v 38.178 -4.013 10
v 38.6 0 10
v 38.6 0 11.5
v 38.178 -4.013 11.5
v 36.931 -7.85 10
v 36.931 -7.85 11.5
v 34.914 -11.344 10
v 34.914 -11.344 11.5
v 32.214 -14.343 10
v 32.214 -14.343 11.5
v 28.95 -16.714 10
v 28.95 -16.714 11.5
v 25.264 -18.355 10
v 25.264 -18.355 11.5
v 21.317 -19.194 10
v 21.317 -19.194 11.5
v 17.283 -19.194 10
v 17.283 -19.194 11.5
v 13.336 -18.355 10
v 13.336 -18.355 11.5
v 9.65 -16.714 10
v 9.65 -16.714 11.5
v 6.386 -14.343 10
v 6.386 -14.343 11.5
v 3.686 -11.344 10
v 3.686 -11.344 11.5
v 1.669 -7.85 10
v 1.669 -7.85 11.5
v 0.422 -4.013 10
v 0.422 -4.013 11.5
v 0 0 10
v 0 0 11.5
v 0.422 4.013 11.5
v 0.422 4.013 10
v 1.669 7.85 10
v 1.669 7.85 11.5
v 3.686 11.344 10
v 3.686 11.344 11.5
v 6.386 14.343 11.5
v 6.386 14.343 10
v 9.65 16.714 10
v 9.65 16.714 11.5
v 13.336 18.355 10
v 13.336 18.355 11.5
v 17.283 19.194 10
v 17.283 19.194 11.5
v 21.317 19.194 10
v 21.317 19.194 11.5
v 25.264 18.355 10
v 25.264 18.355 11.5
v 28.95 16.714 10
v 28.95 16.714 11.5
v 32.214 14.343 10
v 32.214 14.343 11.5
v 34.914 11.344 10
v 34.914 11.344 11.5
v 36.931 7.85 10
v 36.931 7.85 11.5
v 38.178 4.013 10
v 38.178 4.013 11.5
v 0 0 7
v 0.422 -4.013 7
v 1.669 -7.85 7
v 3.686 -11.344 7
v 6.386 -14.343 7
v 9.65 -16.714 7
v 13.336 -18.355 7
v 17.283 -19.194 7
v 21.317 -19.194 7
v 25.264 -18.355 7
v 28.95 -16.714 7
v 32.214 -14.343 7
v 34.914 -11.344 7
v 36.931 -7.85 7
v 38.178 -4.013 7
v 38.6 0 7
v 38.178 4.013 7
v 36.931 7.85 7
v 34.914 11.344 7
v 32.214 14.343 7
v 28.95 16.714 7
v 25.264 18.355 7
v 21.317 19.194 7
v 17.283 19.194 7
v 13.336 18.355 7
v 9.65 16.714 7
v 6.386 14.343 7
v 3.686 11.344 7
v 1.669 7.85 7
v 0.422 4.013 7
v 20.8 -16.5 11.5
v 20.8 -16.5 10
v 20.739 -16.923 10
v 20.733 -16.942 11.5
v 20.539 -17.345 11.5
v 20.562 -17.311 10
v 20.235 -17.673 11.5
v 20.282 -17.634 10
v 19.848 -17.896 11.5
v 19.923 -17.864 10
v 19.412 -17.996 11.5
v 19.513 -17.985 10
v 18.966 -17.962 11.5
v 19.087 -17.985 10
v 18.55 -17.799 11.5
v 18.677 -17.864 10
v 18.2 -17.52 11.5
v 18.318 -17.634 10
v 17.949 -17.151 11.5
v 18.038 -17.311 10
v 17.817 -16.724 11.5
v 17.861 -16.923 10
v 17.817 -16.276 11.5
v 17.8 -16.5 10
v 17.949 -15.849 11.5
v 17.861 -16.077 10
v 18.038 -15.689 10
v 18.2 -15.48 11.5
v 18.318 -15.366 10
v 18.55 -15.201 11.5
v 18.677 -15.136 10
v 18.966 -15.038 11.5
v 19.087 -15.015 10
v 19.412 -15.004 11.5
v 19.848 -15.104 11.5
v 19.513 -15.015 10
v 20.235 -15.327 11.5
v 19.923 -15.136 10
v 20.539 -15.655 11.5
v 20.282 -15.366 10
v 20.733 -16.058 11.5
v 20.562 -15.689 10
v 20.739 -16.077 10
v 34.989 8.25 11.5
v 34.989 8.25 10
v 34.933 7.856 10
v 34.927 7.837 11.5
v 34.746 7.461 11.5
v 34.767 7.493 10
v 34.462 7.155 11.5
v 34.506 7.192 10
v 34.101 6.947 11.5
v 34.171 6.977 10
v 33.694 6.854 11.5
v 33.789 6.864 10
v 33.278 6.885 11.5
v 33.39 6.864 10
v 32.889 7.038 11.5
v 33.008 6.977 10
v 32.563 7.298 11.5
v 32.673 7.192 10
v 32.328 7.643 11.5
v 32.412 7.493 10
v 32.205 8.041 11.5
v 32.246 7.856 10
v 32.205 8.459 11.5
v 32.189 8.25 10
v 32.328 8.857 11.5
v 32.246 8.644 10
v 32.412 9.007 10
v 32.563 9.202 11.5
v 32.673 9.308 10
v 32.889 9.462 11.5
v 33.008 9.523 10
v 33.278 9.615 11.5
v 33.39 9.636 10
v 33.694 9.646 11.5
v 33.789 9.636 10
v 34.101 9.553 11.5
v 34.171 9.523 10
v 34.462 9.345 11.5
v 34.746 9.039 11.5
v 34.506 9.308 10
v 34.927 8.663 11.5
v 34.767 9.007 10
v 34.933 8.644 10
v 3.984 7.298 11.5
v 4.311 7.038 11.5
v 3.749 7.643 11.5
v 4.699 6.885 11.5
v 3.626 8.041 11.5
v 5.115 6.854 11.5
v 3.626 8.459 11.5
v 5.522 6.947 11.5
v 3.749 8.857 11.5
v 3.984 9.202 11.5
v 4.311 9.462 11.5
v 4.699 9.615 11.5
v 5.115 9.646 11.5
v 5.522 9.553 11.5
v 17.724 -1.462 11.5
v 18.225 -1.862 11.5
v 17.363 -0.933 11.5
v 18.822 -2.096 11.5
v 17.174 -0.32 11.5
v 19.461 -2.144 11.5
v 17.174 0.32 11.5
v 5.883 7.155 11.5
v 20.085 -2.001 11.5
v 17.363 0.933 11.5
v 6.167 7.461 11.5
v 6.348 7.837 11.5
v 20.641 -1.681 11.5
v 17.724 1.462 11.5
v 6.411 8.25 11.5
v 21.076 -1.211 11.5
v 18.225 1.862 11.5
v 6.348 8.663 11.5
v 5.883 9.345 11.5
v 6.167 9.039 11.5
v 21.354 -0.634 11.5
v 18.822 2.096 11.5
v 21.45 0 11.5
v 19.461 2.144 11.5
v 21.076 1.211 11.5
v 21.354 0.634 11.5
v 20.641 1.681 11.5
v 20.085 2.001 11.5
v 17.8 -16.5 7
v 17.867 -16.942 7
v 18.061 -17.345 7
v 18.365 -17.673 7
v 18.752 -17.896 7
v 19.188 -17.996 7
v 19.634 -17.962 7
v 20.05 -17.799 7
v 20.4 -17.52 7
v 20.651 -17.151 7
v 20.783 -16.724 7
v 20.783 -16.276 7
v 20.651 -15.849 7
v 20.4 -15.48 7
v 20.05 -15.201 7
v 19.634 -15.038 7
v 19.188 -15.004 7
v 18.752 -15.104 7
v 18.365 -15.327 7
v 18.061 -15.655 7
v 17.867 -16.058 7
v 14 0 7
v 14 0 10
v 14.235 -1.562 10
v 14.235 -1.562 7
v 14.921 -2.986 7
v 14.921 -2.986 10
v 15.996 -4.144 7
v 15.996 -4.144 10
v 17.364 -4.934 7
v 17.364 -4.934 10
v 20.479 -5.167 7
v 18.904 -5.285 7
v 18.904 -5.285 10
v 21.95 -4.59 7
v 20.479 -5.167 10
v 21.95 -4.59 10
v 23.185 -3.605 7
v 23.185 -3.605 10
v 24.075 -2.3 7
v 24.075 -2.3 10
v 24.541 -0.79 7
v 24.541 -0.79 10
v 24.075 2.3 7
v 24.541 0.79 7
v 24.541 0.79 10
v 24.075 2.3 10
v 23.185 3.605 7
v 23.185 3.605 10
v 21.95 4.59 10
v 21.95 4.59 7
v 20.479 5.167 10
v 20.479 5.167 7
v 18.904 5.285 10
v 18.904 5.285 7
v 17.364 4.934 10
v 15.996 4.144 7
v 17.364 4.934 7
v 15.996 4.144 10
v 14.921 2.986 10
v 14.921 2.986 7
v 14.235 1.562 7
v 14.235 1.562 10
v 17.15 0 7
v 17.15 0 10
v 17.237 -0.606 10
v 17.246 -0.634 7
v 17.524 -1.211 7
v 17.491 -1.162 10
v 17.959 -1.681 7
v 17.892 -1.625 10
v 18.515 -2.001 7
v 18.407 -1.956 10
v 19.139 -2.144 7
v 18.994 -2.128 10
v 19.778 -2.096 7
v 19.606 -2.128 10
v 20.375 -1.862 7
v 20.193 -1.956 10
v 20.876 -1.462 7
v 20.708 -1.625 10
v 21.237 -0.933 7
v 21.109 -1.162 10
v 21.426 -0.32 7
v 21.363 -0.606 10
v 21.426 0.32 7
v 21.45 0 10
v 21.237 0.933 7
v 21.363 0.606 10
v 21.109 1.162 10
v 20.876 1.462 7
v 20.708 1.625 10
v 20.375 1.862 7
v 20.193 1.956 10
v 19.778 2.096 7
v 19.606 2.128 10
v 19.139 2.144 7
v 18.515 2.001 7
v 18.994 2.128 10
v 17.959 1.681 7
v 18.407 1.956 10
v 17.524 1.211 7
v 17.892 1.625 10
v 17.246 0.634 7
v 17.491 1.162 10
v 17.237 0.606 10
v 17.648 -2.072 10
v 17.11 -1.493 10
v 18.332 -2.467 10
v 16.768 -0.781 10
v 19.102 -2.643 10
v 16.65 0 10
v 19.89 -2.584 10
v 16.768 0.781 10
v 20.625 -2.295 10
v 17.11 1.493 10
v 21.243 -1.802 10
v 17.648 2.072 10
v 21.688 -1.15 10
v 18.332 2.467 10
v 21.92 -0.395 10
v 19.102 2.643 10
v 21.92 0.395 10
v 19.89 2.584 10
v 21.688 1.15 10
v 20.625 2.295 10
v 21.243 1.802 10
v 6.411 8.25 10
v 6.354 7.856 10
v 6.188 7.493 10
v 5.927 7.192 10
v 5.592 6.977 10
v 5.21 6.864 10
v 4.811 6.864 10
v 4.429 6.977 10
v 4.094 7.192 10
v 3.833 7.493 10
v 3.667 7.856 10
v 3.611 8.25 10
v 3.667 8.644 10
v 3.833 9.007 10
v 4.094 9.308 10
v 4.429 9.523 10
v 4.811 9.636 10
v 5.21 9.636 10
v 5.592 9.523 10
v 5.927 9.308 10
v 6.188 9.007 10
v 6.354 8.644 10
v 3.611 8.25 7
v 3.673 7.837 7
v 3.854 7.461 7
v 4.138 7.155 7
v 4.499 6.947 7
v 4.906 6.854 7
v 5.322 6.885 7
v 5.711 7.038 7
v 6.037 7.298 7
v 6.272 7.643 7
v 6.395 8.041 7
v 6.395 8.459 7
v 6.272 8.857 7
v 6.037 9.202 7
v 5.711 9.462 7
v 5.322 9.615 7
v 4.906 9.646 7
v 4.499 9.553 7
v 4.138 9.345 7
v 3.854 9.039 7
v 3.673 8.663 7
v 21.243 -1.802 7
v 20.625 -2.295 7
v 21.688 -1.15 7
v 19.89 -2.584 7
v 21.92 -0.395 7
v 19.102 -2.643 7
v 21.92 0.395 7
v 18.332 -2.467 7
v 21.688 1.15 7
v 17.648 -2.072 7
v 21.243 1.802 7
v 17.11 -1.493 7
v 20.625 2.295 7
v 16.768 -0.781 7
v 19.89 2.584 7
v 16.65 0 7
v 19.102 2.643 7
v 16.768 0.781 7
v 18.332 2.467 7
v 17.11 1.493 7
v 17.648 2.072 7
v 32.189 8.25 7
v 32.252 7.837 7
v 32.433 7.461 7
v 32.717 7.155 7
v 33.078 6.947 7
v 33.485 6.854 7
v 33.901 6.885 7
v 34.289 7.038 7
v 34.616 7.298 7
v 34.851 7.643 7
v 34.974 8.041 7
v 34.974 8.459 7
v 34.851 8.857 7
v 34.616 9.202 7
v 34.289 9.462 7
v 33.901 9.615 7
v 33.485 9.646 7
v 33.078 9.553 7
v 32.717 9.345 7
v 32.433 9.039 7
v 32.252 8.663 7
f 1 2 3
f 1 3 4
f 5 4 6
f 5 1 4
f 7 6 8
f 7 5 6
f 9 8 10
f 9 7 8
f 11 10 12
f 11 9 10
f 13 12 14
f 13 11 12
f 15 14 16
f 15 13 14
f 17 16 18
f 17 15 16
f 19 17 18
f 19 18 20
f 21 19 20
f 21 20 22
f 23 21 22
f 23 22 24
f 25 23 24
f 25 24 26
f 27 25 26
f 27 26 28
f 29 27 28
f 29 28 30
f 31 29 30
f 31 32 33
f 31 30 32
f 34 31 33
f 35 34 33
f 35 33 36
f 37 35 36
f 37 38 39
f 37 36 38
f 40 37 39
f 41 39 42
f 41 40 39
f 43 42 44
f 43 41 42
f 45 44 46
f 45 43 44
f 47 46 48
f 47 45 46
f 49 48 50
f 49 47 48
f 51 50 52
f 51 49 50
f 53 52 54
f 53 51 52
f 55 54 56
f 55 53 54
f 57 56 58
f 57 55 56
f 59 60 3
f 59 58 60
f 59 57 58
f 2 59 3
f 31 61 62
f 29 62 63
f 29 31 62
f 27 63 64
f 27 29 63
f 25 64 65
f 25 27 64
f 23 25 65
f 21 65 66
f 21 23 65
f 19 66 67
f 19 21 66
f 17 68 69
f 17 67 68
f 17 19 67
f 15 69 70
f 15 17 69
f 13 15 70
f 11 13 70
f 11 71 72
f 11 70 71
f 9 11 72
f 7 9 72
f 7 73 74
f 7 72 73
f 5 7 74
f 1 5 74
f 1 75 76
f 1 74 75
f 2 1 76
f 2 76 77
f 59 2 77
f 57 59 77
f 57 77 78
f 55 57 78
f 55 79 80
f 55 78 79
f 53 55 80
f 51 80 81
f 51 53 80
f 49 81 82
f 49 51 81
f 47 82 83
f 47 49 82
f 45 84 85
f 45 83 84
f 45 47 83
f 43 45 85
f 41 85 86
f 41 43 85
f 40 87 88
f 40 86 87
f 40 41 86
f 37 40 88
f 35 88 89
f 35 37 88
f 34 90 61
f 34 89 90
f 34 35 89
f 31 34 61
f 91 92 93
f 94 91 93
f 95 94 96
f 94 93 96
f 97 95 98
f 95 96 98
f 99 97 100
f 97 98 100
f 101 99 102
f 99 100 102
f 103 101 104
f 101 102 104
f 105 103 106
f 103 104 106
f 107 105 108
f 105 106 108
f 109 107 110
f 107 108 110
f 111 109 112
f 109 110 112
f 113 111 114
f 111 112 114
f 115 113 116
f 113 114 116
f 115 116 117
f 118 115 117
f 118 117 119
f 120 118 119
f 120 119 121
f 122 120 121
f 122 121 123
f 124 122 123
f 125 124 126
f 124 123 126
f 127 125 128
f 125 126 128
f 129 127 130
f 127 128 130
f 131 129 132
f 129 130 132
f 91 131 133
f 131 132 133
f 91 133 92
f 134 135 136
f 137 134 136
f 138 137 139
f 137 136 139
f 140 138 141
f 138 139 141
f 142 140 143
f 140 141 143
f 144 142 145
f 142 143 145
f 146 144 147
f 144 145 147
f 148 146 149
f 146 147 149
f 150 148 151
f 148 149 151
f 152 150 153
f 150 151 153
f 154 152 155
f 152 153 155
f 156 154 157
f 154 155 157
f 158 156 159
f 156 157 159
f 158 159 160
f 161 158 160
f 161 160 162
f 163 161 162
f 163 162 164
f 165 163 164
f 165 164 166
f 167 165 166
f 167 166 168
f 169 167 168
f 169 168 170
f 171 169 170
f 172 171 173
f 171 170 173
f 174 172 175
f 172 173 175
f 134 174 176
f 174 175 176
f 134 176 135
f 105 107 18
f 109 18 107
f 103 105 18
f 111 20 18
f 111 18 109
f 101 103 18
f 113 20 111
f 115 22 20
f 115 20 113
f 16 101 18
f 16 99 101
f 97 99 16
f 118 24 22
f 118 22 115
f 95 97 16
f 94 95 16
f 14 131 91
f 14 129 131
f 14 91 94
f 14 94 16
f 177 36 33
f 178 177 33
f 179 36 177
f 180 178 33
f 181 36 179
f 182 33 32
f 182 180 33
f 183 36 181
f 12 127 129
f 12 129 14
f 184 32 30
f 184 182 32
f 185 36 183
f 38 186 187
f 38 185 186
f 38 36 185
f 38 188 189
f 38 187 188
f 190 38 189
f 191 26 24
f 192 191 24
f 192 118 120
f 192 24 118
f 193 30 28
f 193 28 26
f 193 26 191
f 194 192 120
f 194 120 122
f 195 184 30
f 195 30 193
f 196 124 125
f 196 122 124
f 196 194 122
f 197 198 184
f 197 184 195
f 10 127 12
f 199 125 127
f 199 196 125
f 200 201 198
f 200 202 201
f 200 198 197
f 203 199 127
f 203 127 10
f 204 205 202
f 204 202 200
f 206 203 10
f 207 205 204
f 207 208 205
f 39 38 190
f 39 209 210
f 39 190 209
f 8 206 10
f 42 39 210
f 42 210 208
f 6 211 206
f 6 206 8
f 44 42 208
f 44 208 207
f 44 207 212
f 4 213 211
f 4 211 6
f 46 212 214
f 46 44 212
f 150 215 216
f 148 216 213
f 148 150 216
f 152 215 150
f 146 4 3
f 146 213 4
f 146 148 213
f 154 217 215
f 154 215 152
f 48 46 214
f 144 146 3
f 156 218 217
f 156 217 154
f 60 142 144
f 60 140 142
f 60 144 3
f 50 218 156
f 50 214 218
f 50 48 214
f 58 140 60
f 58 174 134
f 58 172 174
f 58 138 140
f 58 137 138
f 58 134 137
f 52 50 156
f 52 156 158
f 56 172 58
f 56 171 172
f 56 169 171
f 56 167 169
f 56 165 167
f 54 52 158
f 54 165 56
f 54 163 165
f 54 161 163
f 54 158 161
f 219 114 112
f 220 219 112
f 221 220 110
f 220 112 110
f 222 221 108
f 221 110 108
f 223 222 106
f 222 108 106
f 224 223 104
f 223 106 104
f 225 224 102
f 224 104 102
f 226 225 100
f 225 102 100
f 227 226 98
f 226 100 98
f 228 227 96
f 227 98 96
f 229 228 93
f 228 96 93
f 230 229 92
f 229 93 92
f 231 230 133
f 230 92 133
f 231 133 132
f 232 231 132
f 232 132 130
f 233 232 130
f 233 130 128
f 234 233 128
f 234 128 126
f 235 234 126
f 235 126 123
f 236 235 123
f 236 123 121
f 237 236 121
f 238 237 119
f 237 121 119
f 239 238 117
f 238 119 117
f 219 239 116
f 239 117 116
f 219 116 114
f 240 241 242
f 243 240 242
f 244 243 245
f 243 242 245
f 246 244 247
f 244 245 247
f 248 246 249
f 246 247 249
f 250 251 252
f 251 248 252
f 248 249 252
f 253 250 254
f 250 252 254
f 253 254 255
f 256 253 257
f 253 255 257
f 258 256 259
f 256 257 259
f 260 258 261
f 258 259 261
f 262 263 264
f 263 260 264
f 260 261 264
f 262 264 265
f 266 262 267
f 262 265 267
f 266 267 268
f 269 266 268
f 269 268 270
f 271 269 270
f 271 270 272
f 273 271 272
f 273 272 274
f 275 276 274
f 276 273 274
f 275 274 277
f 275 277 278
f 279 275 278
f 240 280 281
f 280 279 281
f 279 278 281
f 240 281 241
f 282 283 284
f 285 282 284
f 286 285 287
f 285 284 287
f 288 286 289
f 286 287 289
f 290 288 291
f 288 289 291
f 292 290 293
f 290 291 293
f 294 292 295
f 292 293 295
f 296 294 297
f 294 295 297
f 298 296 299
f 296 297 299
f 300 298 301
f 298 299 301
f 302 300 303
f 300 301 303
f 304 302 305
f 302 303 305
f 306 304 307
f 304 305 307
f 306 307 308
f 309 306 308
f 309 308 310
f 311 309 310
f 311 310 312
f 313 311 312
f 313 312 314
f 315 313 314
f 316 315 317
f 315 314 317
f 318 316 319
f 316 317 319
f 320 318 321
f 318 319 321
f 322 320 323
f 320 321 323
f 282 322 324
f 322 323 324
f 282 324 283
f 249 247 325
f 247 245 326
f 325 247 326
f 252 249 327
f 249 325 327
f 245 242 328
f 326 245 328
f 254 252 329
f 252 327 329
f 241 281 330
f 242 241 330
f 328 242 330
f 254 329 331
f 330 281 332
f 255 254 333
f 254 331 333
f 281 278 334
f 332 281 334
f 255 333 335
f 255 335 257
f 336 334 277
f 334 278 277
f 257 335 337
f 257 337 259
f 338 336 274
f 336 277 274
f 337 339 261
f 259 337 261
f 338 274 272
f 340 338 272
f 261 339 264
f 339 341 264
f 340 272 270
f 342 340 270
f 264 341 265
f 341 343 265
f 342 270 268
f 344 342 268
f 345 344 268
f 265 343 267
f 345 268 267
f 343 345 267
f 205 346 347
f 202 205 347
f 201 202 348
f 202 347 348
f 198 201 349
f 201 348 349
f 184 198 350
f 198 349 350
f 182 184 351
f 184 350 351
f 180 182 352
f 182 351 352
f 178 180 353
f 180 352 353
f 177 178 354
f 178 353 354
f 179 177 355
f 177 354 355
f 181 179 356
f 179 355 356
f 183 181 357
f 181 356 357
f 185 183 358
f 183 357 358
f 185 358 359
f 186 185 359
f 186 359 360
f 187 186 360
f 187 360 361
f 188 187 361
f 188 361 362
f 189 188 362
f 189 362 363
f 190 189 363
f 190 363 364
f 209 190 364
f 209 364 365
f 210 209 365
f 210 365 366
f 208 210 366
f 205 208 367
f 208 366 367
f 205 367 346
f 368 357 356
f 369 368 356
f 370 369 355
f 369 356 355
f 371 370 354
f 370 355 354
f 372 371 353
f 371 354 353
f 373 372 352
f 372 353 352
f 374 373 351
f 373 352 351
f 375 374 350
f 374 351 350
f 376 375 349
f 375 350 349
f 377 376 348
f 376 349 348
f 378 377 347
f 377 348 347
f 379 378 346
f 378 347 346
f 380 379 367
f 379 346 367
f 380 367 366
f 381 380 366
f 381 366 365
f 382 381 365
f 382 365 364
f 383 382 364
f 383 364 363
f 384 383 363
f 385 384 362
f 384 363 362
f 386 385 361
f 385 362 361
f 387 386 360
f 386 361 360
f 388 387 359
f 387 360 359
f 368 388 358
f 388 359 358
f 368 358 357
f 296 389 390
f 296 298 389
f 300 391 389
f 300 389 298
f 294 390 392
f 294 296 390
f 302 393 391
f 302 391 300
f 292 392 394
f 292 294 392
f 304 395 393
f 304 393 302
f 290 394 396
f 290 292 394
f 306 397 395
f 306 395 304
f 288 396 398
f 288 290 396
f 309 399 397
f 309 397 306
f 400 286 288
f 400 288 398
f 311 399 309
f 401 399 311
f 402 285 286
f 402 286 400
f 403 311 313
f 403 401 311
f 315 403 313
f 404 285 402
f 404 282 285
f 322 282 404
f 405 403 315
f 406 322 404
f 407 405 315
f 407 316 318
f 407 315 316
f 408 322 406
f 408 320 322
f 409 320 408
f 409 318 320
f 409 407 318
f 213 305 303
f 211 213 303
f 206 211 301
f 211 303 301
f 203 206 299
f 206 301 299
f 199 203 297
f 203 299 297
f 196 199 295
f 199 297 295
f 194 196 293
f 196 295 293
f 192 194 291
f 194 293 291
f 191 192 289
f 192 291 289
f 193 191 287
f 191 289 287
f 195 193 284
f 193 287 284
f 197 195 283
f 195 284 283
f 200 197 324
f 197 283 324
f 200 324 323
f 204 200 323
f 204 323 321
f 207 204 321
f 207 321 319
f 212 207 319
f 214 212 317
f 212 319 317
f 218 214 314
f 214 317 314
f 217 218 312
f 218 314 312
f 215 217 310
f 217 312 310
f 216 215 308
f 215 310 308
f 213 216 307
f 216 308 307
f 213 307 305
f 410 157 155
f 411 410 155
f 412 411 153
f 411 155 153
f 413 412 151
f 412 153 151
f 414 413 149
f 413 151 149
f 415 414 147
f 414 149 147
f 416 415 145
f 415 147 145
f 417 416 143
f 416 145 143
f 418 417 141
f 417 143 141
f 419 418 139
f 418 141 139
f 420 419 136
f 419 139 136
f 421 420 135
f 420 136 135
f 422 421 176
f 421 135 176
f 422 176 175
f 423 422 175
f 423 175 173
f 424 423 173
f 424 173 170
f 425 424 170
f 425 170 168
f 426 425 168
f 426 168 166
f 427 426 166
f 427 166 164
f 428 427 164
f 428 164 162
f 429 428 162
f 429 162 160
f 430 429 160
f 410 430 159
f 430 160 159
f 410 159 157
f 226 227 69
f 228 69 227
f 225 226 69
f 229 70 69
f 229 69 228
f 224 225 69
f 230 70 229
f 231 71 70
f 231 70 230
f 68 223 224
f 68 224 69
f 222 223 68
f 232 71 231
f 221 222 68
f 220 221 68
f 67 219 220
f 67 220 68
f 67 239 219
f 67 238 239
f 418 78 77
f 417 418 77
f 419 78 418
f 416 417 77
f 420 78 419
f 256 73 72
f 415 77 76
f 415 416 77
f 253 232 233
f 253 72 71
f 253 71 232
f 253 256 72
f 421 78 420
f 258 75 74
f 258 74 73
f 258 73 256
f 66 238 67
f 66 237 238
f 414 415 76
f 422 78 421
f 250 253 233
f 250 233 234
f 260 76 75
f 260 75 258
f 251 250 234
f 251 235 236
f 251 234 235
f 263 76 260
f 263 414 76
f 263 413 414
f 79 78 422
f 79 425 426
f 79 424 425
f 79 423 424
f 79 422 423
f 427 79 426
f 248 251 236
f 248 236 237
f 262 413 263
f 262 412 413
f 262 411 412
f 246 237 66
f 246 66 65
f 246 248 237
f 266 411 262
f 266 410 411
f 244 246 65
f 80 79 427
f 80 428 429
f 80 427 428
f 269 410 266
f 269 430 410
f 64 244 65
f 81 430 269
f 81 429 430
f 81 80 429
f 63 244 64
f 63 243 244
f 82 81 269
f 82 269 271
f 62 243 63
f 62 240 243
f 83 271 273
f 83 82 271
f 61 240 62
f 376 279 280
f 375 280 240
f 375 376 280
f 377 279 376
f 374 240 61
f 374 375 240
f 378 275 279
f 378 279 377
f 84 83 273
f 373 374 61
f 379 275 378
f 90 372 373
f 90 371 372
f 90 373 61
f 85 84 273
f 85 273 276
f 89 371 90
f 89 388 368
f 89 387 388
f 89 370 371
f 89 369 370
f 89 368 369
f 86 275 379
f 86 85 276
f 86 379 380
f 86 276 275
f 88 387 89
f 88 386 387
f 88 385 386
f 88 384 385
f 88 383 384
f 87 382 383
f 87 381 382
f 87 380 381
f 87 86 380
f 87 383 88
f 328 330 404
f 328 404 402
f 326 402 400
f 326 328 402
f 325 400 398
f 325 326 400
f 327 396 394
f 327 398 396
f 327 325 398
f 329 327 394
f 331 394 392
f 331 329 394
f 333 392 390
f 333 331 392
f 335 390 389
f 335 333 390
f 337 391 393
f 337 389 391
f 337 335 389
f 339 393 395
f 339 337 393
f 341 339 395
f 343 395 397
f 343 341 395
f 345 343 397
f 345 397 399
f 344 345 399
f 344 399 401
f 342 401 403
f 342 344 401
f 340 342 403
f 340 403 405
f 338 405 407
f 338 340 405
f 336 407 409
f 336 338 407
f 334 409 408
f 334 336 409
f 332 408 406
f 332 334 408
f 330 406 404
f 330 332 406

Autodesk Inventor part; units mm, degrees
ref_plane "YZ Plane" through (0, 0, 0) normal (1, 0, 0) x (0, 1, 0)
ref_plane "XY Plane" through (0, 0, 0) normal (0, 0, 1) x (1, 0, 0)
ref_plane "Arbeitsebene1" through (0, 0, 10) normal (0, 0, 1) x (1, 0, 0)
sketch "Skizze1" plane through (0, 0, 10) normal (0, 0, 1) x (1, 0, 0)
  circle A0 centre (19.3, 0) radius 19.3 projected
  circle A1 centre (5.0106, 8.25) radius 1.4 projected
  circle A2 centre (33.5894, 8.25) radius 1.4 projected
  circle A3 centre (19.3, -16.5) radius 1.5 projected
  circle A4 centre (19.3, 0) radius 2.15
  point P0 (0, 0)
  dimension "d0" = 4.3
extrude "Extrusion1" add sketch "Skizze1" along normal blind 1.5
sketch "Skizze2" plane through (19.3, 0, 10) normal (0, 0, -1) x (-1, 0, 0)
  circle A0 centre (0, 0) radius 2.15 projected
  circle A1 centre (0, 0) radius 5.3
  circle A2 centre (0, 0) radius 19.3 projected
  circle A3 centre (0, 0) radius 2.15 projected
  circle A4 centre (0, -16.5) radius 1.5 projected
  circle A5 centre (-14.2894, 8.25) radius 1.4 projected
  circle A6 centre (14.2894, 8.25) radius 1.4 projected
  circle A7 centre (0, 0) radius 5.8
  circle A8 centre (0, 0) radius 8
  circle A9 centre (0, 0) radius 2.65
  point P0 (19.3, 0)
  dimension "d6" = 10.6
  dimension "d7" = 0.5
  dimension "d8" = 16
  dimension "d13" = 0.5
extrude "Extrusion2" add sketch "Skizze2" along normal blind 3 contours A2 | A7 | A8 | A9
sketch "Skizze3" plane through (0, 0, 0) normal (0, 1, 0) x (-1, 0, 0)
  point P0 (0, 0)
ref_plane "Arbeitsebene2" through (0, 5, 0) normal (0, 1, 0) x (-1, 0, 0)
properties part number "50_ETL_Top_Seal_v1"
